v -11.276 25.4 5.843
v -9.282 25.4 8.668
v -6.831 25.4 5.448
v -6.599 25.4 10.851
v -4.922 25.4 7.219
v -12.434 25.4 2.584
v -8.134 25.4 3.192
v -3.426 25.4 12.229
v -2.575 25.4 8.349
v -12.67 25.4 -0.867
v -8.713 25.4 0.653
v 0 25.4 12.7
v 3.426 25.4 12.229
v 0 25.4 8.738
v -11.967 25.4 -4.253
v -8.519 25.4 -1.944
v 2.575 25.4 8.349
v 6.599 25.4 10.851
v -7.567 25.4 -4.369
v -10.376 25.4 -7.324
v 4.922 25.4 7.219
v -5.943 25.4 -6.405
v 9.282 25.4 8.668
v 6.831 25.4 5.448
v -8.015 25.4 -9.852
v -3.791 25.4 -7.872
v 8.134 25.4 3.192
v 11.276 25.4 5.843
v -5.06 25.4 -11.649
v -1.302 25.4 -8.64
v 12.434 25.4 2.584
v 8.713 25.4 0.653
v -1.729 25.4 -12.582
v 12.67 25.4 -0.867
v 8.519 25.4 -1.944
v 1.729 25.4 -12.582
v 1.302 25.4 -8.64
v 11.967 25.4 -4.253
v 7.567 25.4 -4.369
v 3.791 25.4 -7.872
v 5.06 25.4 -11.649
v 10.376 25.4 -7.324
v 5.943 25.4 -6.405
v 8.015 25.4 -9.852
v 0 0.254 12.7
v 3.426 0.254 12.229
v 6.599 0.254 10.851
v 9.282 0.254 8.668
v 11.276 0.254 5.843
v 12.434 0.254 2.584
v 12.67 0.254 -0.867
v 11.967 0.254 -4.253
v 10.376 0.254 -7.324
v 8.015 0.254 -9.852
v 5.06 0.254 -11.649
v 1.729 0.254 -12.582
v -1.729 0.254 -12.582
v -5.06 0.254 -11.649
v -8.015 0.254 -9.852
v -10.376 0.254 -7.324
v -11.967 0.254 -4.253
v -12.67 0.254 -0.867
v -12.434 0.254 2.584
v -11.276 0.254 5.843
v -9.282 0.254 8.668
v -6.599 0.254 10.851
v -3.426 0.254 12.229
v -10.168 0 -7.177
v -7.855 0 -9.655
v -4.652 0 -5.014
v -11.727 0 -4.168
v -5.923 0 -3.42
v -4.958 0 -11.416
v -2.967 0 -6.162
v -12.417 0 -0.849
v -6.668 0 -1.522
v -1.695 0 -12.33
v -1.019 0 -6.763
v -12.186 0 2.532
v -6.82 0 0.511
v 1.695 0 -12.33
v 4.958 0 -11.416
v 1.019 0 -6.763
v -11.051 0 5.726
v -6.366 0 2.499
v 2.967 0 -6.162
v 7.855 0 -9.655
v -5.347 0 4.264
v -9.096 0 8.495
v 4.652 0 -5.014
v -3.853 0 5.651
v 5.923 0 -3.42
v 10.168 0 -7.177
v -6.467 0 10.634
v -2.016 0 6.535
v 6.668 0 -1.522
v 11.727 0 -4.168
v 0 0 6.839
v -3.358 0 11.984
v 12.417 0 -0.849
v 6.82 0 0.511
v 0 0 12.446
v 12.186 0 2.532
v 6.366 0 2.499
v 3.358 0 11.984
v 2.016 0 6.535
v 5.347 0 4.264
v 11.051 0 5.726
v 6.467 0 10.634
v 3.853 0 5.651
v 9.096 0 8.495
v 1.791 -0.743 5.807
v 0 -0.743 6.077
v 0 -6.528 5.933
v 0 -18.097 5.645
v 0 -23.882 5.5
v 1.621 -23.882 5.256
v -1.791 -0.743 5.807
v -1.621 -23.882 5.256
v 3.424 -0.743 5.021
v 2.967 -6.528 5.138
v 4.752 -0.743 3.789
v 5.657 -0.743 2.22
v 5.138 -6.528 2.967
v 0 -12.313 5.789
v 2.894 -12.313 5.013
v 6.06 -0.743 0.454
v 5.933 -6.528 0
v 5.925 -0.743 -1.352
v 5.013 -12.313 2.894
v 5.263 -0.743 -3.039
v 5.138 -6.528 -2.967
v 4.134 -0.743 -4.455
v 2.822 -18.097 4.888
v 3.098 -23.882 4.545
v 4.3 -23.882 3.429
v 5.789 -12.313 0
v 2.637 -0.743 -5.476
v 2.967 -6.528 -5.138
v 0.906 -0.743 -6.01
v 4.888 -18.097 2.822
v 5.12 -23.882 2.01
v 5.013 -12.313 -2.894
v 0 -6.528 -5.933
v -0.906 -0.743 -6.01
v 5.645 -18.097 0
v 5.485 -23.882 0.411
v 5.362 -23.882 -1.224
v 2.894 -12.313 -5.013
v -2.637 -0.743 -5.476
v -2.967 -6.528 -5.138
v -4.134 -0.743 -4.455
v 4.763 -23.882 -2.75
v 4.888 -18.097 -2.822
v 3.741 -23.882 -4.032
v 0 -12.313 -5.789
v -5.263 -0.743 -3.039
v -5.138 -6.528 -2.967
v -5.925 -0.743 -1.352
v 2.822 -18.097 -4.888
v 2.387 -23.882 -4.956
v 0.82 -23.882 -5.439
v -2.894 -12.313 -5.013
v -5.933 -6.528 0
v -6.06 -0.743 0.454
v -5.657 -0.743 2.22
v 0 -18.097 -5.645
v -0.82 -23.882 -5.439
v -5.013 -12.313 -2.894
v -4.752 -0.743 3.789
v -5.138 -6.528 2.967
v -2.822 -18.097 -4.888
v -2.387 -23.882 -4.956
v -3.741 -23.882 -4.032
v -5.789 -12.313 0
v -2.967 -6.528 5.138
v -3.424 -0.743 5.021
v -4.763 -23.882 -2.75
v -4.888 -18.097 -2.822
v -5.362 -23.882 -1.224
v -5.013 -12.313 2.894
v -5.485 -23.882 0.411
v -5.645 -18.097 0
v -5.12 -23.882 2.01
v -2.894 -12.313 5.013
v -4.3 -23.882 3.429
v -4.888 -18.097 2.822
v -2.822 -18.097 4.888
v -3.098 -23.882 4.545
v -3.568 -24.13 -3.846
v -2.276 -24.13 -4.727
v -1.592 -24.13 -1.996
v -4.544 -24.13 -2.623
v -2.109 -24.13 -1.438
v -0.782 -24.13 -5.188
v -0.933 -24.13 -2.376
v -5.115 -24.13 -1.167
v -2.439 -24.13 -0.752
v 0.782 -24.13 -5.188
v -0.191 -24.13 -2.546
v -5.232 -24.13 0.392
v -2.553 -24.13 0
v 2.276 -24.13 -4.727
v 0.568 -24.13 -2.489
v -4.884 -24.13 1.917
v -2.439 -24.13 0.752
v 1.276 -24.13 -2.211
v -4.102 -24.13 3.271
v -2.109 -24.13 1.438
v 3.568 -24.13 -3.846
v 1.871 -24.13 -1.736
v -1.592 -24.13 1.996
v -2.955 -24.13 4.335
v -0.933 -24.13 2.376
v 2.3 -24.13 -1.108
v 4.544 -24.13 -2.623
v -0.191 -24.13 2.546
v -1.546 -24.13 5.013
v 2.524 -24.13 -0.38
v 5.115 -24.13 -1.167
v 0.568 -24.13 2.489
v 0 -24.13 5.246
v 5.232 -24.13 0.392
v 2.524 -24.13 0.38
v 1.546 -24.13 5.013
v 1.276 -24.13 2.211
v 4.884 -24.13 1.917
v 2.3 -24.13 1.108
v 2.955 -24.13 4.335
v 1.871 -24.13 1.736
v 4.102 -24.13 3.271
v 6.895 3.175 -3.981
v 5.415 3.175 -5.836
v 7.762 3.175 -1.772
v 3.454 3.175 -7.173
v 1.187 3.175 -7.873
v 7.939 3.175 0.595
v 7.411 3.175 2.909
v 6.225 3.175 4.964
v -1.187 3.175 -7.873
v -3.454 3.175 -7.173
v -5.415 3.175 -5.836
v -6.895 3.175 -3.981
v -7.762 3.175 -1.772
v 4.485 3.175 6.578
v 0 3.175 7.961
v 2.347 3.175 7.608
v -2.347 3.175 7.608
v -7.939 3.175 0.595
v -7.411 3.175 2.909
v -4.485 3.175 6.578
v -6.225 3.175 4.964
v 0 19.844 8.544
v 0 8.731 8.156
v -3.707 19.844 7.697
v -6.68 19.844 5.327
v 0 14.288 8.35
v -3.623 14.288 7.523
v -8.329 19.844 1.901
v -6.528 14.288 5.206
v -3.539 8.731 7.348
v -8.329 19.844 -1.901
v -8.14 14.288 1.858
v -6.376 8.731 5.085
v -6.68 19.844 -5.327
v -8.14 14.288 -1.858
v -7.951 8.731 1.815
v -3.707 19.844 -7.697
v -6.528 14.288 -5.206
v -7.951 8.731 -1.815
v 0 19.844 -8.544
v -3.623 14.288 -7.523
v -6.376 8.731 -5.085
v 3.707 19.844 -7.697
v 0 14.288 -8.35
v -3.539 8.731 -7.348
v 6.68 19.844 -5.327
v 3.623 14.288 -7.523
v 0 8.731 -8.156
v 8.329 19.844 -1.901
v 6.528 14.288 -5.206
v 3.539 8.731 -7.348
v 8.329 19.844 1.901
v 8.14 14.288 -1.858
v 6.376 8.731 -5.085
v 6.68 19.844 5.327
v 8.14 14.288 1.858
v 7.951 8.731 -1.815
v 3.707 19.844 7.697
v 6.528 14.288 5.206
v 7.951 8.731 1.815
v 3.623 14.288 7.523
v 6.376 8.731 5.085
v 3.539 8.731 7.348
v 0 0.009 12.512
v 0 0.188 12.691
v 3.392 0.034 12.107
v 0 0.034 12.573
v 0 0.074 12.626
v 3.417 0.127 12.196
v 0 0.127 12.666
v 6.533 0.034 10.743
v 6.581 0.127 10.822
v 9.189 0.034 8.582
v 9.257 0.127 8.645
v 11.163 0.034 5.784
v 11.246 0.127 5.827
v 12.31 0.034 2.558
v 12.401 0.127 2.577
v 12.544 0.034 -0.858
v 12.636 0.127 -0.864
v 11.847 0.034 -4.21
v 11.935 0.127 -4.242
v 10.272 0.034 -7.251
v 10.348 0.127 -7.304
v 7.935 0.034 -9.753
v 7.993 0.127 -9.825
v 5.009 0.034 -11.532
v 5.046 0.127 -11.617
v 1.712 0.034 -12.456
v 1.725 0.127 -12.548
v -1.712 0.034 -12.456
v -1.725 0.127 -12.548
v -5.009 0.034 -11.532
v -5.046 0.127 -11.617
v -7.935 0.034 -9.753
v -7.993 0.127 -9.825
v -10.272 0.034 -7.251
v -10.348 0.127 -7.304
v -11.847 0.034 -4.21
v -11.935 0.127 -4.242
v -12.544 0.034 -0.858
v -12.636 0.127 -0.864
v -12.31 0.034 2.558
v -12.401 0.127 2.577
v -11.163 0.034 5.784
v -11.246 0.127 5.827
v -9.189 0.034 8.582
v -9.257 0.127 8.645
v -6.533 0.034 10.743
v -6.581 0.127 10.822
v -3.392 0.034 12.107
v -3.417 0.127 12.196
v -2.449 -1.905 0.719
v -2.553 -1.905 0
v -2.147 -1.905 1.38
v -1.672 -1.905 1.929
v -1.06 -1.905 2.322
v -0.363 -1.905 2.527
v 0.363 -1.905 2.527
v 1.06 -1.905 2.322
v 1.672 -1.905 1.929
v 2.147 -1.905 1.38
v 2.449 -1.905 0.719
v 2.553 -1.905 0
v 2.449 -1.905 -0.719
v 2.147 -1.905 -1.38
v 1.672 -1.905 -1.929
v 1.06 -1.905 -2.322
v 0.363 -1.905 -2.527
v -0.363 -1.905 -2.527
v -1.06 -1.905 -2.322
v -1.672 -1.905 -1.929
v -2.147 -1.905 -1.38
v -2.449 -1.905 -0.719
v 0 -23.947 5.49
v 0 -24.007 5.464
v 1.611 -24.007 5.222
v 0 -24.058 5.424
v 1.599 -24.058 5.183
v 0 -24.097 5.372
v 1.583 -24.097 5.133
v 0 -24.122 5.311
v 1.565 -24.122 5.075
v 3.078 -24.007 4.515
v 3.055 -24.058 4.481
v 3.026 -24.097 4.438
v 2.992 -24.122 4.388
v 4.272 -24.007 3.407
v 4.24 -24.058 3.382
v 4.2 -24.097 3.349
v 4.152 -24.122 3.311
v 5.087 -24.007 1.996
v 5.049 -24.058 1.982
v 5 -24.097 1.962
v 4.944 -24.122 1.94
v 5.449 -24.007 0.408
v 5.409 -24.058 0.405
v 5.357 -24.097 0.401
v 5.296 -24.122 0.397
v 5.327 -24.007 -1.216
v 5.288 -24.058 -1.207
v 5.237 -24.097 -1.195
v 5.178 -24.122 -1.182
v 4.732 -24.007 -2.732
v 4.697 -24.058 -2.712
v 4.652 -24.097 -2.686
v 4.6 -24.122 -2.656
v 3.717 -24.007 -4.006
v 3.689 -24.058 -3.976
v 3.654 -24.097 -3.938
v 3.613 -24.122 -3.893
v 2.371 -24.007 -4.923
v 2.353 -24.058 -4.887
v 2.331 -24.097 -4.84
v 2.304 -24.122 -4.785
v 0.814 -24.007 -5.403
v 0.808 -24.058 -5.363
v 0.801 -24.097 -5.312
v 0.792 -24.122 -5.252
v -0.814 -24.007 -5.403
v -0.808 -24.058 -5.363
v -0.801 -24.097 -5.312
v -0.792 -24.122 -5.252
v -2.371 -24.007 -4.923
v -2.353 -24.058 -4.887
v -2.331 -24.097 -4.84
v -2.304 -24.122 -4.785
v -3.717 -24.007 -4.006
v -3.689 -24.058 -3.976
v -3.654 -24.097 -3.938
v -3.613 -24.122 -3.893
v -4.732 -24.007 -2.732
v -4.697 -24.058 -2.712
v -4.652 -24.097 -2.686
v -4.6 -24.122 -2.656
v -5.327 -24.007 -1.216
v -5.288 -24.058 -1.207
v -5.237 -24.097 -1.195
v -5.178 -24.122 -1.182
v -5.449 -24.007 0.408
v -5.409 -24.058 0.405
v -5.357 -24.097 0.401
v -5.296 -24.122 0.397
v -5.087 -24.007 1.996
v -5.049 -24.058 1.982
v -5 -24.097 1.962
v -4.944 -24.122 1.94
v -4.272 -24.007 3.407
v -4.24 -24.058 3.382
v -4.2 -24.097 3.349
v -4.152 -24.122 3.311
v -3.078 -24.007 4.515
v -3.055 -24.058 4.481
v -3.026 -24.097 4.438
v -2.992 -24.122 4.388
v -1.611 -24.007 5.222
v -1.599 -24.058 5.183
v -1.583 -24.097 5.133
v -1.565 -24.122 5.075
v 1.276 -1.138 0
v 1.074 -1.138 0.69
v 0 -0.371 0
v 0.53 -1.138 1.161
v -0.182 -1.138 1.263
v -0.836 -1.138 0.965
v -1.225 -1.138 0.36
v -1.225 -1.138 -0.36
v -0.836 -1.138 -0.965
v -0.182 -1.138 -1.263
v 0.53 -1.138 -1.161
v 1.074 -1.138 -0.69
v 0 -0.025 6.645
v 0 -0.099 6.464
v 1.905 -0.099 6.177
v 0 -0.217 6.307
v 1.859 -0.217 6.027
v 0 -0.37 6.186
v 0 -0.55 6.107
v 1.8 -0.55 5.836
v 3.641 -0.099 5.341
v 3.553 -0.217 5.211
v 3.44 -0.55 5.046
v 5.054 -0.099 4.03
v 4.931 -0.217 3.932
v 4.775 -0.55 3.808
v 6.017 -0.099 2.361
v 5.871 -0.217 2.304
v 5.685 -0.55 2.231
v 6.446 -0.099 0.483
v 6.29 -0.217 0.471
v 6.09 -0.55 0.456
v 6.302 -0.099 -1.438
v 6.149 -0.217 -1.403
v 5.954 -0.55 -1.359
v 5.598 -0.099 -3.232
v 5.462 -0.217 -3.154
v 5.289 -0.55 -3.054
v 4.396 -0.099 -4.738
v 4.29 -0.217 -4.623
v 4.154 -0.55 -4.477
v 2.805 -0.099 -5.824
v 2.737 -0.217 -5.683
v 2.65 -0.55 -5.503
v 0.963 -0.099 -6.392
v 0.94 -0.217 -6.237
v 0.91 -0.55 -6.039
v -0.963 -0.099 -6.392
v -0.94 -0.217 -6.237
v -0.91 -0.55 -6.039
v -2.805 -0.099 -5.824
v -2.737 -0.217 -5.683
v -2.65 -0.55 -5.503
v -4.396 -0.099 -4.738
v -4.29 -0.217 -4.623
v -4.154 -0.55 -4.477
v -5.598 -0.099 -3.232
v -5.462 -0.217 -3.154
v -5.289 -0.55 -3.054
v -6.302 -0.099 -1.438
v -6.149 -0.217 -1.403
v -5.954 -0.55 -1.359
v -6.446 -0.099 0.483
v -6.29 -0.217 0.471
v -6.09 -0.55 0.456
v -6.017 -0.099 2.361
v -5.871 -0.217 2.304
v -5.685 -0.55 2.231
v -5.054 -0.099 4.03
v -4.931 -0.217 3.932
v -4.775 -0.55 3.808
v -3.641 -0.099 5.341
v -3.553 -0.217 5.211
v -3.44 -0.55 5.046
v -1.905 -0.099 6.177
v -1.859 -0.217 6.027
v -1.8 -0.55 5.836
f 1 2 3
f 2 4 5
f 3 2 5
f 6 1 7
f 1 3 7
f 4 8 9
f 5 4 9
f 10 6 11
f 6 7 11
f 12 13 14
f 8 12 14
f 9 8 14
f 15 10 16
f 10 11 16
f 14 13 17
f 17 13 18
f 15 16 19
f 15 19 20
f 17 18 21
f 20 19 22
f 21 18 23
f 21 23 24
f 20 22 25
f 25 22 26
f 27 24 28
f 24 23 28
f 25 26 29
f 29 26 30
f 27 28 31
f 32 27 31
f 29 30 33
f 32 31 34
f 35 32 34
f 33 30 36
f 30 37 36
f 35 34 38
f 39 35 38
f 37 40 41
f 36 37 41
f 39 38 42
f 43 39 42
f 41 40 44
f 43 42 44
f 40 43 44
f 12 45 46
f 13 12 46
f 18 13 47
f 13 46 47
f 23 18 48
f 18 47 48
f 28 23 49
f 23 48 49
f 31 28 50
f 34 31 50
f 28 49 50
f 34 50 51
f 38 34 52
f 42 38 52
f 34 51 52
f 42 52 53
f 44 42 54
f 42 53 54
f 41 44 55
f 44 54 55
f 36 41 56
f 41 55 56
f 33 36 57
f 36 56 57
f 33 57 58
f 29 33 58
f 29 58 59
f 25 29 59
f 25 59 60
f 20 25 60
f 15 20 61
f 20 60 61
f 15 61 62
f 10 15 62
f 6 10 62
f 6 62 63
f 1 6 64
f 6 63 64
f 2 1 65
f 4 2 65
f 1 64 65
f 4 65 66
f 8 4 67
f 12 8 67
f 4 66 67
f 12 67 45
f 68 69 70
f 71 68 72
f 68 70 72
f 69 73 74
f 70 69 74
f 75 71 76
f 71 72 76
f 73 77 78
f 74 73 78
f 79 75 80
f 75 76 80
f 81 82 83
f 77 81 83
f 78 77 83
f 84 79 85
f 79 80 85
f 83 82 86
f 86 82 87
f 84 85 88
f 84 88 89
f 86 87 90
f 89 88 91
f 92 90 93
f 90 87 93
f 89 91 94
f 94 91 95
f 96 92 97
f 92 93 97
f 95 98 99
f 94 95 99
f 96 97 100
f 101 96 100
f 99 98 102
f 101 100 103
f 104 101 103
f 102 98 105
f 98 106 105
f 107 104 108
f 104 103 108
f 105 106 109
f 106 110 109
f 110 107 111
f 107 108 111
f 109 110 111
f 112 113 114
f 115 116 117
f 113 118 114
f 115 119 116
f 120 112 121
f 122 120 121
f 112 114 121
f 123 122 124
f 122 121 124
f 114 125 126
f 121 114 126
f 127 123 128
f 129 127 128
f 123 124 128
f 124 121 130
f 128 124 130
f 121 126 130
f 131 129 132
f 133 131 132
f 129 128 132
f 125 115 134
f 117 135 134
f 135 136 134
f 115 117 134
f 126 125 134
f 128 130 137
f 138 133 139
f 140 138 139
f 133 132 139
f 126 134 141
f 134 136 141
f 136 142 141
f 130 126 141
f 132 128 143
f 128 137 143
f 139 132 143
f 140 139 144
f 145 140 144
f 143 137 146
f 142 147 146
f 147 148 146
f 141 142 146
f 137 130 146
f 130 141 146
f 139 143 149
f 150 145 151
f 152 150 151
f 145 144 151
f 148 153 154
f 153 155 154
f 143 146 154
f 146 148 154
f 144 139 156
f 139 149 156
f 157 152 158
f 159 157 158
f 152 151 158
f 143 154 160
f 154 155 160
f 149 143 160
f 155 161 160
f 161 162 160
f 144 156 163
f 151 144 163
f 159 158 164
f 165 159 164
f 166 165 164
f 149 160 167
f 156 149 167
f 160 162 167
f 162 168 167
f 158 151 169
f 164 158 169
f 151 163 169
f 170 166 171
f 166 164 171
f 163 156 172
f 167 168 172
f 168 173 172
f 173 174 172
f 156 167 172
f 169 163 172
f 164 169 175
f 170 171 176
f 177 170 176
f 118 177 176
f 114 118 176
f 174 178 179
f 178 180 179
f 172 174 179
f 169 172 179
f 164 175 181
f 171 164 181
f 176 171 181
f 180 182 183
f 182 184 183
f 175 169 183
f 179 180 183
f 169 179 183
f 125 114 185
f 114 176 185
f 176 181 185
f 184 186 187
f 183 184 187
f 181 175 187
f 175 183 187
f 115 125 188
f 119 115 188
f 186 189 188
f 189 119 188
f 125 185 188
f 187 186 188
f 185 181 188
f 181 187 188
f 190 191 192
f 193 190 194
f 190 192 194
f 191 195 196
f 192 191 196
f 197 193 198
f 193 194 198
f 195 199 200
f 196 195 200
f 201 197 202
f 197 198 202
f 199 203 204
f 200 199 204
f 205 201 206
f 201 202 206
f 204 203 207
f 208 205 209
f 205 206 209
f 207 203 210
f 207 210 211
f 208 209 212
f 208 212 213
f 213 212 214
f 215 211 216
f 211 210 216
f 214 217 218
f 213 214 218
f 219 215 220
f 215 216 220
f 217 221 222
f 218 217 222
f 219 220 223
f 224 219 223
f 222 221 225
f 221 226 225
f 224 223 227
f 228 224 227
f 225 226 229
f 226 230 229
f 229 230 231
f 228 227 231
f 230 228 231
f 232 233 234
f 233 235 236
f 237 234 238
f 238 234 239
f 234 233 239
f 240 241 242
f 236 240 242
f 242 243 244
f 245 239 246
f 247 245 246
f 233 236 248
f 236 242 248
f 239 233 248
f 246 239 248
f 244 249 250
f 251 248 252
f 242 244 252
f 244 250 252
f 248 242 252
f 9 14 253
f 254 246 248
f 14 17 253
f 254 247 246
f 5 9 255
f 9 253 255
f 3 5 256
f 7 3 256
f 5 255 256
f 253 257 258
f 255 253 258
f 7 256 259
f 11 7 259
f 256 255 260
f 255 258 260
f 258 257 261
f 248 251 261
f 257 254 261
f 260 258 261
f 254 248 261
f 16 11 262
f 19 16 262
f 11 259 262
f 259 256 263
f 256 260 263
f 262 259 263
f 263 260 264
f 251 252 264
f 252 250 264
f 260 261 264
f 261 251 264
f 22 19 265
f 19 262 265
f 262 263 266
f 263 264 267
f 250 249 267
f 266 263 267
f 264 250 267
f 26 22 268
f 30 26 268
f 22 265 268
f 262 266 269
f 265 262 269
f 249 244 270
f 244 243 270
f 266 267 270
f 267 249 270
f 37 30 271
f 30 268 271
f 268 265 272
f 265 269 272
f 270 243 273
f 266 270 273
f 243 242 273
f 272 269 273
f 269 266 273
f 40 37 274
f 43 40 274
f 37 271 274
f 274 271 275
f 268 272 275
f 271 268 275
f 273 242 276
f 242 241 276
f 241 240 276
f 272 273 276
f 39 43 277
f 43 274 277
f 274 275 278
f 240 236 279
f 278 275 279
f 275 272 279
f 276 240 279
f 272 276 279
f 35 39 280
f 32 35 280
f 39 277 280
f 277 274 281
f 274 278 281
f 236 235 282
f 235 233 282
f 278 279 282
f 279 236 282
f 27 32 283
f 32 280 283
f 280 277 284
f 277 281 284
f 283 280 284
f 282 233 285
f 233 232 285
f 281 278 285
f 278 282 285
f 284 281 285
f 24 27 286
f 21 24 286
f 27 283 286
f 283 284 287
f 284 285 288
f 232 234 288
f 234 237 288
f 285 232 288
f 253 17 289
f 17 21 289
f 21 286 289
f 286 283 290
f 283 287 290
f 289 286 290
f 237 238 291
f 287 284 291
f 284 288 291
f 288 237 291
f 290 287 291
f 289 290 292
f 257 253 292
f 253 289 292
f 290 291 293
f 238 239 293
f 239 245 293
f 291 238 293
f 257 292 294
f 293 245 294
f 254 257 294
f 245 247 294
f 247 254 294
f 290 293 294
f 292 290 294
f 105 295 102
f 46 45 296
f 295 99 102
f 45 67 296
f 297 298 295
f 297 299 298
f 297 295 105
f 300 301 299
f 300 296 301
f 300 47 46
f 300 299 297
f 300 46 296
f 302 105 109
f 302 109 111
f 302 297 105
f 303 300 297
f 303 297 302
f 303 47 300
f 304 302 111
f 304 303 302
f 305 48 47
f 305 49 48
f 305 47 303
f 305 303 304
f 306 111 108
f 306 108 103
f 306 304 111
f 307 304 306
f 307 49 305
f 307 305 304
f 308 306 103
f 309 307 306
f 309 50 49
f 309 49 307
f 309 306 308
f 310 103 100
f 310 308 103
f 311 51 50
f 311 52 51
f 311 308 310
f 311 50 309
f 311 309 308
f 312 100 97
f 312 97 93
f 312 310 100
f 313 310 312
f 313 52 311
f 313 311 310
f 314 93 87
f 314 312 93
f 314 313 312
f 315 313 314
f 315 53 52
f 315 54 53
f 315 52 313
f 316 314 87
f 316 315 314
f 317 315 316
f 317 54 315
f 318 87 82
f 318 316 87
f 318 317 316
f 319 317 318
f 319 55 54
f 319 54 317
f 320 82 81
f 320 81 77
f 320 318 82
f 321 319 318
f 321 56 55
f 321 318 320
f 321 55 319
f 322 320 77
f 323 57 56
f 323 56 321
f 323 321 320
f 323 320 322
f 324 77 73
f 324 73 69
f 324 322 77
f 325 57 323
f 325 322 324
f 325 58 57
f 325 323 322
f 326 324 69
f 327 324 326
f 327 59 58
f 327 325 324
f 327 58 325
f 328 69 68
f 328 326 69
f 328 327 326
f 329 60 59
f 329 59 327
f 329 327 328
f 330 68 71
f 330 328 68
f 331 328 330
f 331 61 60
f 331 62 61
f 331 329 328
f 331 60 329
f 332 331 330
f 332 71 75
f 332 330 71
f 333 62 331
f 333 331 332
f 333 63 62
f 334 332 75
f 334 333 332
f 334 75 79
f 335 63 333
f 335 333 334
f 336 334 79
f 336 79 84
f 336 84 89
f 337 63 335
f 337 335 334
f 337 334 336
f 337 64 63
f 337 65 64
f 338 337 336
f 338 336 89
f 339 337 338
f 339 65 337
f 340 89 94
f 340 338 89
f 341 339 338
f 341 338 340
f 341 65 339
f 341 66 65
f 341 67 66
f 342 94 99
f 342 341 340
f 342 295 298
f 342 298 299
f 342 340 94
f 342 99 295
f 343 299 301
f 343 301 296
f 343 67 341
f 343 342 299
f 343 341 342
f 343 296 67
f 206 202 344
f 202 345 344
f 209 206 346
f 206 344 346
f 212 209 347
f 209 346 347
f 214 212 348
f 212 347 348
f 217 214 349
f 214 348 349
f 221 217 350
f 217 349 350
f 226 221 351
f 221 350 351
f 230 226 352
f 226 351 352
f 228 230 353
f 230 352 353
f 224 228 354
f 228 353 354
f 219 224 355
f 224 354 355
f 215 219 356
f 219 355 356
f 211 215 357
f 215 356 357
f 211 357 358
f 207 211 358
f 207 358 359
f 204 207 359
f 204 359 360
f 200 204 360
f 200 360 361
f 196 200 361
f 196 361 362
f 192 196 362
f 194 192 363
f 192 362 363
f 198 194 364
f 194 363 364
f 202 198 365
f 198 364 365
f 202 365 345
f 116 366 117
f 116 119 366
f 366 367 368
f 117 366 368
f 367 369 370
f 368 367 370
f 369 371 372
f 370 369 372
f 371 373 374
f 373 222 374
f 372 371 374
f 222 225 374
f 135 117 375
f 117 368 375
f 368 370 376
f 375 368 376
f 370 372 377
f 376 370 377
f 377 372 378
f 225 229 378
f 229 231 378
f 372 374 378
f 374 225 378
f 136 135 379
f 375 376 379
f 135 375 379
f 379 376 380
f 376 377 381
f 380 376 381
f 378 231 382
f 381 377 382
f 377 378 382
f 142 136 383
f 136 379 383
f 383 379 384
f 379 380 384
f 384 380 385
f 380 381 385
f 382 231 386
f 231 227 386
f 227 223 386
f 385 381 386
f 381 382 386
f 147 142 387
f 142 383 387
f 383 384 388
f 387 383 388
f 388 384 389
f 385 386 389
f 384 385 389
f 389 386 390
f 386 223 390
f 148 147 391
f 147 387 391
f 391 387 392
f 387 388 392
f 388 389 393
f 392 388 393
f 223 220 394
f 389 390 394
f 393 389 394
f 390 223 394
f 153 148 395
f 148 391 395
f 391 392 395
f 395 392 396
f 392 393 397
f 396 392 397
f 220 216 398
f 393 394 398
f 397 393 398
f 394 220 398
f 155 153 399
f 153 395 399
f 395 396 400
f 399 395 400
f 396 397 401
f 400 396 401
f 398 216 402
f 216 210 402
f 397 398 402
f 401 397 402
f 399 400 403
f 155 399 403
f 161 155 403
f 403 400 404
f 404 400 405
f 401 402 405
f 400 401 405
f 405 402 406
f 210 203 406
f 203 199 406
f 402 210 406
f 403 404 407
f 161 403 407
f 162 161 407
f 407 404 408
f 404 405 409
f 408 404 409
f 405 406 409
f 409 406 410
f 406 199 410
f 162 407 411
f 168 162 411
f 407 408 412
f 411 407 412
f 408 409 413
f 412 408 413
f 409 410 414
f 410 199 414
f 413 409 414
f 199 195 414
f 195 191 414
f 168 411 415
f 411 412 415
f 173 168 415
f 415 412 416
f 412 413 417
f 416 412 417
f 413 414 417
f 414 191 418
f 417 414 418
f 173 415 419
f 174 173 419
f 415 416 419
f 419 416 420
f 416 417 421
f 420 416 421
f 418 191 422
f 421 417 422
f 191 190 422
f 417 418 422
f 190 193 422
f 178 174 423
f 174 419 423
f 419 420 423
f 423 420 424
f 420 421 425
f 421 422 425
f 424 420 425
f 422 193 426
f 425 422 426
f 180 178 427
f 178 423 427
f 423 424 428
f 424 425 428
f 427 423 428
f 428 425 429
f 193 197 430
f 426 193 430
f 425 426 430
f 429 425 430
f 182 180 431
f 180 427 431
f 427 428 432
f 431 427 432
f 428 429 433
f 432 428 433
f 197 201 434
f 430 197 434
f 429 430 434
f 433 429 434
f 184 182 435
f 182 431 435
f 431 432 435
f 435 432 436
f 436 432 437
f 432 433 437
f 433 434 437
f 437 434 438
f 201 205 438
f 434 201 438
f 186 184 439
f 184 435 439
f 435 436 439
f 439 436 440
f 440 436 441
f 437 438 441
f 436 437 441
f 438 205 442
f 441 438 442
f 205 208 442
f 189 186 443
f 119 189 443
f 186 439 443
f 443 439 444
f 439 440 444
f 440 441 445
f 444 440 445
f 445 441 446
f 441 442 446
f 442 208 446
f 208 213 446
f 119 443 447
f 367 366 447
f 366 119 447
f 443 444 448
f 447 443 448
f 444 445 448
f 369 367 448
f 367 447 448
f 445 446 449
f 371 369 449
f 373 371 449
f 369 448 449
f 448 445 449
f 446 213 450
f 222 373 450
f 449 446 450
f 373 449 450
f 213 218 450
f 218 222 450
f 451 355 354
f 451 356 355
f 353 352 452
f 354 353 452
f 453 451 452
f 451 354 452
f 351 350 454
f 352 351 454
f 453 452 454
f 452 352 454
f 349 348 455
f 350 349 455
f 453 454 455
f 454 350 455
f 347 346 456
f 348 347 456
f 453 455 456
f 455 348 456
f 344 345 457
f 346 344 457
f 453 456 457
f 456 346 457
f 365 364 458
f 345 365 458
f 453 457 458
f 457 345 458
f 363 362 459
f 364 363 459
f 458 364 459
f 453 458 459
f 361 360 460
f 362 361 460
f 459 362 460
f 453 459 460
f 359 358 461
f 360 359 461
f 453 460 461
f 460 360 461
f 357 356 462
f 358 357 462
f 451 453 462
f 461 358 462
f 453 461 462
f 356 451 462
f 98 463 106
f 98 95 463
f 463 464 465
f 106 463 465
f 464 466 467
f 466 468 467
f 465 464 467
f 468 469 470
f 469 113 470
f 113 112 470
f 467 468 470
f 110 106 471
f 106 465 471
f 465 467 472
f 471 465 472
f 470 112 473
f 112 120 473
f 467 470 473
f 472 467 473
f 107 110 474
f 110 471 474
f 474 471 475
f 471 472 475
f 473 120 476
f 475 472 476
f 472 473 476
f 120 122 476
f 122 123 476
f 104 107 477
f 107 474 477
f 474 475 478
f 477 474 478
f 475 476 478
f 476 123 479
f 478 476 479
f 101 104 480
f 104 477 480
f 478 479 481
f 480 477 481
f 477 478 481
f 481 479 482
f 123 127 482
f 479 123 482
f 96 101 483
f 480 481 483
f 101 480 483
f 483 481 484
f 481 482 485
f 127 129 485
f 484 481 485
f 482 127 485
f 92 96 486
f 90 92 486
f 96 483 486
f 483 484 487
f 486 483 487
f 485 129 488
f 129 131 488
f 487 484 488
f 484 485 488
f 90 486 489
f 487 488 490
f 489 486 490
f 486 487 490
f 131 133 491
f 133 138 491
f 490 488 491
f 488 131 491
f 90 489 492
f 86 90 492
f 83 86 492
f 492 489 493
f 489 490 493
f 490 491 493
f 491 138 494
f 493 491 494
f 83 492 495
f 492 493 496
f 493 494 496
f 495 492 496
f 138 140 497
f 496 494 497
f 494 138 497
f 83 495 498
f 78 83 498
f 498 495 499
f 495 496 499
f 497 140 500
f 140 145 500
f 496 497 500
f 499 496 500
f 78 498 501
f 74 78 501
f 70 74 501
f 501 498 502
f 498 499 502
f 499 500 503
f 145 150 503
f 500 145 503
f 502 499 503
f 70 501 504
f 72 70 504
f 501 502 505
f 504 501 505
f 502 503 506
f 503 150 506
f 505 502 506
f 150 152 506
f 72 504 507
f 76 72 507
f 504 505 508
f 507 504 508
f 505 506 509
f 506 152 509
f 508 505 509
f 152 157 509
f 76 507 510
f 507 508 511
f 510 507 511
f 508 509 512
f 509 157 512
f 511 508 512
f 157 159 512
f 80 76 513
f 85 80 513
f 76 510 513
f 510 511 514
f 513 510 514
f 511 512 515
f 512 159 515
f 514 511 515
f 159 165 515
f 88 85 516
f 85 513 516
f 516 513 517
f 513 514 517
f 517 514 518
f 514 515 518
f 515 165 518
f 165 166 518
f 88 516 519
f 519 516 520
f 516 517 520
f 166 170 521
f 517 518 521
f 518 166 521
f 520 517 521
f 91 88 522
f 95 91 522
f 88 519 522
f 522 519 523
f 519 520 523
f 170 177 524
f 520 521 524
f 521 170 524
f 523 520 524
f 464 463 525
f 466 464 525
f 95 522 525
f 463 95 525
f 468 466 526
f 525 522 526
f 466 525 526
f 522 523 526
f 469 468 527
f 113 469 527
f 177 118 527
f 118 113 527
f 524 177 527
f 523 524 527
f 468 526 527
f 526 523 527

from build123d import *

# Parameters (mm, degrees)
F3_D     = 5.1054
F3_DEPTH = 22.225
F3_TIP   = 1.5338169022
F4_R     = 0.762
F5_R     = 0.254


with BuildPart() as f1:
    # F0 (on Right) → F1 (revolve)
    with BuildSketch(Plane.YZ):
        Polygon((-24.13, 0), (25.4, 0), (25.4, 12.7), (0, 12.7), (0, 6.096), (-24.13, 5.4941811878), align=None)
    revolve(axis=Axis((0, 0.635, 0), (0, 1, 0)))

    # F3
    with Locations(Plane.XZ.offset(24.13)):
        with Locations((0, 0)):
            Hole(F3_D / 2, depth=F3_DEPTH)
            with Locations((0, 0, -(F3_DEPTH + F3_TIP / 2))):  # 118° drill point
                Cone(0, F3_D / 2, F3_TIP, mode=Mode.SUBTRACT)

    # F4
    f4_edges = [f1.edges().sort_by_distance(p)[0] for p in [
        (0, 0, -6.096),
    ]]
    fillet(f4_edges, radius=F4_R)

    # F5
    f5_edges = [f1.edges().sort_by_distance(p)[0] for p in [
        (0, 0, -12.7),
        (0, -24.13, -5.494181),
    ]]
    fillet(f5_edges, radius=F5_R)

    # F6 (on Right) → F7 (revolve, cut)
    with BuildSketch(Plane.YZ):
        Polygon((3.175, 0), (25.4, 0), (25.4, 8.7376), (3.175, 7.961485898), align=None)
    revolve(axis=Axis((0, 14.2875, 0), (0, -1, 0)), mode=Mode.SUBTRACT)


solid = f1.part
